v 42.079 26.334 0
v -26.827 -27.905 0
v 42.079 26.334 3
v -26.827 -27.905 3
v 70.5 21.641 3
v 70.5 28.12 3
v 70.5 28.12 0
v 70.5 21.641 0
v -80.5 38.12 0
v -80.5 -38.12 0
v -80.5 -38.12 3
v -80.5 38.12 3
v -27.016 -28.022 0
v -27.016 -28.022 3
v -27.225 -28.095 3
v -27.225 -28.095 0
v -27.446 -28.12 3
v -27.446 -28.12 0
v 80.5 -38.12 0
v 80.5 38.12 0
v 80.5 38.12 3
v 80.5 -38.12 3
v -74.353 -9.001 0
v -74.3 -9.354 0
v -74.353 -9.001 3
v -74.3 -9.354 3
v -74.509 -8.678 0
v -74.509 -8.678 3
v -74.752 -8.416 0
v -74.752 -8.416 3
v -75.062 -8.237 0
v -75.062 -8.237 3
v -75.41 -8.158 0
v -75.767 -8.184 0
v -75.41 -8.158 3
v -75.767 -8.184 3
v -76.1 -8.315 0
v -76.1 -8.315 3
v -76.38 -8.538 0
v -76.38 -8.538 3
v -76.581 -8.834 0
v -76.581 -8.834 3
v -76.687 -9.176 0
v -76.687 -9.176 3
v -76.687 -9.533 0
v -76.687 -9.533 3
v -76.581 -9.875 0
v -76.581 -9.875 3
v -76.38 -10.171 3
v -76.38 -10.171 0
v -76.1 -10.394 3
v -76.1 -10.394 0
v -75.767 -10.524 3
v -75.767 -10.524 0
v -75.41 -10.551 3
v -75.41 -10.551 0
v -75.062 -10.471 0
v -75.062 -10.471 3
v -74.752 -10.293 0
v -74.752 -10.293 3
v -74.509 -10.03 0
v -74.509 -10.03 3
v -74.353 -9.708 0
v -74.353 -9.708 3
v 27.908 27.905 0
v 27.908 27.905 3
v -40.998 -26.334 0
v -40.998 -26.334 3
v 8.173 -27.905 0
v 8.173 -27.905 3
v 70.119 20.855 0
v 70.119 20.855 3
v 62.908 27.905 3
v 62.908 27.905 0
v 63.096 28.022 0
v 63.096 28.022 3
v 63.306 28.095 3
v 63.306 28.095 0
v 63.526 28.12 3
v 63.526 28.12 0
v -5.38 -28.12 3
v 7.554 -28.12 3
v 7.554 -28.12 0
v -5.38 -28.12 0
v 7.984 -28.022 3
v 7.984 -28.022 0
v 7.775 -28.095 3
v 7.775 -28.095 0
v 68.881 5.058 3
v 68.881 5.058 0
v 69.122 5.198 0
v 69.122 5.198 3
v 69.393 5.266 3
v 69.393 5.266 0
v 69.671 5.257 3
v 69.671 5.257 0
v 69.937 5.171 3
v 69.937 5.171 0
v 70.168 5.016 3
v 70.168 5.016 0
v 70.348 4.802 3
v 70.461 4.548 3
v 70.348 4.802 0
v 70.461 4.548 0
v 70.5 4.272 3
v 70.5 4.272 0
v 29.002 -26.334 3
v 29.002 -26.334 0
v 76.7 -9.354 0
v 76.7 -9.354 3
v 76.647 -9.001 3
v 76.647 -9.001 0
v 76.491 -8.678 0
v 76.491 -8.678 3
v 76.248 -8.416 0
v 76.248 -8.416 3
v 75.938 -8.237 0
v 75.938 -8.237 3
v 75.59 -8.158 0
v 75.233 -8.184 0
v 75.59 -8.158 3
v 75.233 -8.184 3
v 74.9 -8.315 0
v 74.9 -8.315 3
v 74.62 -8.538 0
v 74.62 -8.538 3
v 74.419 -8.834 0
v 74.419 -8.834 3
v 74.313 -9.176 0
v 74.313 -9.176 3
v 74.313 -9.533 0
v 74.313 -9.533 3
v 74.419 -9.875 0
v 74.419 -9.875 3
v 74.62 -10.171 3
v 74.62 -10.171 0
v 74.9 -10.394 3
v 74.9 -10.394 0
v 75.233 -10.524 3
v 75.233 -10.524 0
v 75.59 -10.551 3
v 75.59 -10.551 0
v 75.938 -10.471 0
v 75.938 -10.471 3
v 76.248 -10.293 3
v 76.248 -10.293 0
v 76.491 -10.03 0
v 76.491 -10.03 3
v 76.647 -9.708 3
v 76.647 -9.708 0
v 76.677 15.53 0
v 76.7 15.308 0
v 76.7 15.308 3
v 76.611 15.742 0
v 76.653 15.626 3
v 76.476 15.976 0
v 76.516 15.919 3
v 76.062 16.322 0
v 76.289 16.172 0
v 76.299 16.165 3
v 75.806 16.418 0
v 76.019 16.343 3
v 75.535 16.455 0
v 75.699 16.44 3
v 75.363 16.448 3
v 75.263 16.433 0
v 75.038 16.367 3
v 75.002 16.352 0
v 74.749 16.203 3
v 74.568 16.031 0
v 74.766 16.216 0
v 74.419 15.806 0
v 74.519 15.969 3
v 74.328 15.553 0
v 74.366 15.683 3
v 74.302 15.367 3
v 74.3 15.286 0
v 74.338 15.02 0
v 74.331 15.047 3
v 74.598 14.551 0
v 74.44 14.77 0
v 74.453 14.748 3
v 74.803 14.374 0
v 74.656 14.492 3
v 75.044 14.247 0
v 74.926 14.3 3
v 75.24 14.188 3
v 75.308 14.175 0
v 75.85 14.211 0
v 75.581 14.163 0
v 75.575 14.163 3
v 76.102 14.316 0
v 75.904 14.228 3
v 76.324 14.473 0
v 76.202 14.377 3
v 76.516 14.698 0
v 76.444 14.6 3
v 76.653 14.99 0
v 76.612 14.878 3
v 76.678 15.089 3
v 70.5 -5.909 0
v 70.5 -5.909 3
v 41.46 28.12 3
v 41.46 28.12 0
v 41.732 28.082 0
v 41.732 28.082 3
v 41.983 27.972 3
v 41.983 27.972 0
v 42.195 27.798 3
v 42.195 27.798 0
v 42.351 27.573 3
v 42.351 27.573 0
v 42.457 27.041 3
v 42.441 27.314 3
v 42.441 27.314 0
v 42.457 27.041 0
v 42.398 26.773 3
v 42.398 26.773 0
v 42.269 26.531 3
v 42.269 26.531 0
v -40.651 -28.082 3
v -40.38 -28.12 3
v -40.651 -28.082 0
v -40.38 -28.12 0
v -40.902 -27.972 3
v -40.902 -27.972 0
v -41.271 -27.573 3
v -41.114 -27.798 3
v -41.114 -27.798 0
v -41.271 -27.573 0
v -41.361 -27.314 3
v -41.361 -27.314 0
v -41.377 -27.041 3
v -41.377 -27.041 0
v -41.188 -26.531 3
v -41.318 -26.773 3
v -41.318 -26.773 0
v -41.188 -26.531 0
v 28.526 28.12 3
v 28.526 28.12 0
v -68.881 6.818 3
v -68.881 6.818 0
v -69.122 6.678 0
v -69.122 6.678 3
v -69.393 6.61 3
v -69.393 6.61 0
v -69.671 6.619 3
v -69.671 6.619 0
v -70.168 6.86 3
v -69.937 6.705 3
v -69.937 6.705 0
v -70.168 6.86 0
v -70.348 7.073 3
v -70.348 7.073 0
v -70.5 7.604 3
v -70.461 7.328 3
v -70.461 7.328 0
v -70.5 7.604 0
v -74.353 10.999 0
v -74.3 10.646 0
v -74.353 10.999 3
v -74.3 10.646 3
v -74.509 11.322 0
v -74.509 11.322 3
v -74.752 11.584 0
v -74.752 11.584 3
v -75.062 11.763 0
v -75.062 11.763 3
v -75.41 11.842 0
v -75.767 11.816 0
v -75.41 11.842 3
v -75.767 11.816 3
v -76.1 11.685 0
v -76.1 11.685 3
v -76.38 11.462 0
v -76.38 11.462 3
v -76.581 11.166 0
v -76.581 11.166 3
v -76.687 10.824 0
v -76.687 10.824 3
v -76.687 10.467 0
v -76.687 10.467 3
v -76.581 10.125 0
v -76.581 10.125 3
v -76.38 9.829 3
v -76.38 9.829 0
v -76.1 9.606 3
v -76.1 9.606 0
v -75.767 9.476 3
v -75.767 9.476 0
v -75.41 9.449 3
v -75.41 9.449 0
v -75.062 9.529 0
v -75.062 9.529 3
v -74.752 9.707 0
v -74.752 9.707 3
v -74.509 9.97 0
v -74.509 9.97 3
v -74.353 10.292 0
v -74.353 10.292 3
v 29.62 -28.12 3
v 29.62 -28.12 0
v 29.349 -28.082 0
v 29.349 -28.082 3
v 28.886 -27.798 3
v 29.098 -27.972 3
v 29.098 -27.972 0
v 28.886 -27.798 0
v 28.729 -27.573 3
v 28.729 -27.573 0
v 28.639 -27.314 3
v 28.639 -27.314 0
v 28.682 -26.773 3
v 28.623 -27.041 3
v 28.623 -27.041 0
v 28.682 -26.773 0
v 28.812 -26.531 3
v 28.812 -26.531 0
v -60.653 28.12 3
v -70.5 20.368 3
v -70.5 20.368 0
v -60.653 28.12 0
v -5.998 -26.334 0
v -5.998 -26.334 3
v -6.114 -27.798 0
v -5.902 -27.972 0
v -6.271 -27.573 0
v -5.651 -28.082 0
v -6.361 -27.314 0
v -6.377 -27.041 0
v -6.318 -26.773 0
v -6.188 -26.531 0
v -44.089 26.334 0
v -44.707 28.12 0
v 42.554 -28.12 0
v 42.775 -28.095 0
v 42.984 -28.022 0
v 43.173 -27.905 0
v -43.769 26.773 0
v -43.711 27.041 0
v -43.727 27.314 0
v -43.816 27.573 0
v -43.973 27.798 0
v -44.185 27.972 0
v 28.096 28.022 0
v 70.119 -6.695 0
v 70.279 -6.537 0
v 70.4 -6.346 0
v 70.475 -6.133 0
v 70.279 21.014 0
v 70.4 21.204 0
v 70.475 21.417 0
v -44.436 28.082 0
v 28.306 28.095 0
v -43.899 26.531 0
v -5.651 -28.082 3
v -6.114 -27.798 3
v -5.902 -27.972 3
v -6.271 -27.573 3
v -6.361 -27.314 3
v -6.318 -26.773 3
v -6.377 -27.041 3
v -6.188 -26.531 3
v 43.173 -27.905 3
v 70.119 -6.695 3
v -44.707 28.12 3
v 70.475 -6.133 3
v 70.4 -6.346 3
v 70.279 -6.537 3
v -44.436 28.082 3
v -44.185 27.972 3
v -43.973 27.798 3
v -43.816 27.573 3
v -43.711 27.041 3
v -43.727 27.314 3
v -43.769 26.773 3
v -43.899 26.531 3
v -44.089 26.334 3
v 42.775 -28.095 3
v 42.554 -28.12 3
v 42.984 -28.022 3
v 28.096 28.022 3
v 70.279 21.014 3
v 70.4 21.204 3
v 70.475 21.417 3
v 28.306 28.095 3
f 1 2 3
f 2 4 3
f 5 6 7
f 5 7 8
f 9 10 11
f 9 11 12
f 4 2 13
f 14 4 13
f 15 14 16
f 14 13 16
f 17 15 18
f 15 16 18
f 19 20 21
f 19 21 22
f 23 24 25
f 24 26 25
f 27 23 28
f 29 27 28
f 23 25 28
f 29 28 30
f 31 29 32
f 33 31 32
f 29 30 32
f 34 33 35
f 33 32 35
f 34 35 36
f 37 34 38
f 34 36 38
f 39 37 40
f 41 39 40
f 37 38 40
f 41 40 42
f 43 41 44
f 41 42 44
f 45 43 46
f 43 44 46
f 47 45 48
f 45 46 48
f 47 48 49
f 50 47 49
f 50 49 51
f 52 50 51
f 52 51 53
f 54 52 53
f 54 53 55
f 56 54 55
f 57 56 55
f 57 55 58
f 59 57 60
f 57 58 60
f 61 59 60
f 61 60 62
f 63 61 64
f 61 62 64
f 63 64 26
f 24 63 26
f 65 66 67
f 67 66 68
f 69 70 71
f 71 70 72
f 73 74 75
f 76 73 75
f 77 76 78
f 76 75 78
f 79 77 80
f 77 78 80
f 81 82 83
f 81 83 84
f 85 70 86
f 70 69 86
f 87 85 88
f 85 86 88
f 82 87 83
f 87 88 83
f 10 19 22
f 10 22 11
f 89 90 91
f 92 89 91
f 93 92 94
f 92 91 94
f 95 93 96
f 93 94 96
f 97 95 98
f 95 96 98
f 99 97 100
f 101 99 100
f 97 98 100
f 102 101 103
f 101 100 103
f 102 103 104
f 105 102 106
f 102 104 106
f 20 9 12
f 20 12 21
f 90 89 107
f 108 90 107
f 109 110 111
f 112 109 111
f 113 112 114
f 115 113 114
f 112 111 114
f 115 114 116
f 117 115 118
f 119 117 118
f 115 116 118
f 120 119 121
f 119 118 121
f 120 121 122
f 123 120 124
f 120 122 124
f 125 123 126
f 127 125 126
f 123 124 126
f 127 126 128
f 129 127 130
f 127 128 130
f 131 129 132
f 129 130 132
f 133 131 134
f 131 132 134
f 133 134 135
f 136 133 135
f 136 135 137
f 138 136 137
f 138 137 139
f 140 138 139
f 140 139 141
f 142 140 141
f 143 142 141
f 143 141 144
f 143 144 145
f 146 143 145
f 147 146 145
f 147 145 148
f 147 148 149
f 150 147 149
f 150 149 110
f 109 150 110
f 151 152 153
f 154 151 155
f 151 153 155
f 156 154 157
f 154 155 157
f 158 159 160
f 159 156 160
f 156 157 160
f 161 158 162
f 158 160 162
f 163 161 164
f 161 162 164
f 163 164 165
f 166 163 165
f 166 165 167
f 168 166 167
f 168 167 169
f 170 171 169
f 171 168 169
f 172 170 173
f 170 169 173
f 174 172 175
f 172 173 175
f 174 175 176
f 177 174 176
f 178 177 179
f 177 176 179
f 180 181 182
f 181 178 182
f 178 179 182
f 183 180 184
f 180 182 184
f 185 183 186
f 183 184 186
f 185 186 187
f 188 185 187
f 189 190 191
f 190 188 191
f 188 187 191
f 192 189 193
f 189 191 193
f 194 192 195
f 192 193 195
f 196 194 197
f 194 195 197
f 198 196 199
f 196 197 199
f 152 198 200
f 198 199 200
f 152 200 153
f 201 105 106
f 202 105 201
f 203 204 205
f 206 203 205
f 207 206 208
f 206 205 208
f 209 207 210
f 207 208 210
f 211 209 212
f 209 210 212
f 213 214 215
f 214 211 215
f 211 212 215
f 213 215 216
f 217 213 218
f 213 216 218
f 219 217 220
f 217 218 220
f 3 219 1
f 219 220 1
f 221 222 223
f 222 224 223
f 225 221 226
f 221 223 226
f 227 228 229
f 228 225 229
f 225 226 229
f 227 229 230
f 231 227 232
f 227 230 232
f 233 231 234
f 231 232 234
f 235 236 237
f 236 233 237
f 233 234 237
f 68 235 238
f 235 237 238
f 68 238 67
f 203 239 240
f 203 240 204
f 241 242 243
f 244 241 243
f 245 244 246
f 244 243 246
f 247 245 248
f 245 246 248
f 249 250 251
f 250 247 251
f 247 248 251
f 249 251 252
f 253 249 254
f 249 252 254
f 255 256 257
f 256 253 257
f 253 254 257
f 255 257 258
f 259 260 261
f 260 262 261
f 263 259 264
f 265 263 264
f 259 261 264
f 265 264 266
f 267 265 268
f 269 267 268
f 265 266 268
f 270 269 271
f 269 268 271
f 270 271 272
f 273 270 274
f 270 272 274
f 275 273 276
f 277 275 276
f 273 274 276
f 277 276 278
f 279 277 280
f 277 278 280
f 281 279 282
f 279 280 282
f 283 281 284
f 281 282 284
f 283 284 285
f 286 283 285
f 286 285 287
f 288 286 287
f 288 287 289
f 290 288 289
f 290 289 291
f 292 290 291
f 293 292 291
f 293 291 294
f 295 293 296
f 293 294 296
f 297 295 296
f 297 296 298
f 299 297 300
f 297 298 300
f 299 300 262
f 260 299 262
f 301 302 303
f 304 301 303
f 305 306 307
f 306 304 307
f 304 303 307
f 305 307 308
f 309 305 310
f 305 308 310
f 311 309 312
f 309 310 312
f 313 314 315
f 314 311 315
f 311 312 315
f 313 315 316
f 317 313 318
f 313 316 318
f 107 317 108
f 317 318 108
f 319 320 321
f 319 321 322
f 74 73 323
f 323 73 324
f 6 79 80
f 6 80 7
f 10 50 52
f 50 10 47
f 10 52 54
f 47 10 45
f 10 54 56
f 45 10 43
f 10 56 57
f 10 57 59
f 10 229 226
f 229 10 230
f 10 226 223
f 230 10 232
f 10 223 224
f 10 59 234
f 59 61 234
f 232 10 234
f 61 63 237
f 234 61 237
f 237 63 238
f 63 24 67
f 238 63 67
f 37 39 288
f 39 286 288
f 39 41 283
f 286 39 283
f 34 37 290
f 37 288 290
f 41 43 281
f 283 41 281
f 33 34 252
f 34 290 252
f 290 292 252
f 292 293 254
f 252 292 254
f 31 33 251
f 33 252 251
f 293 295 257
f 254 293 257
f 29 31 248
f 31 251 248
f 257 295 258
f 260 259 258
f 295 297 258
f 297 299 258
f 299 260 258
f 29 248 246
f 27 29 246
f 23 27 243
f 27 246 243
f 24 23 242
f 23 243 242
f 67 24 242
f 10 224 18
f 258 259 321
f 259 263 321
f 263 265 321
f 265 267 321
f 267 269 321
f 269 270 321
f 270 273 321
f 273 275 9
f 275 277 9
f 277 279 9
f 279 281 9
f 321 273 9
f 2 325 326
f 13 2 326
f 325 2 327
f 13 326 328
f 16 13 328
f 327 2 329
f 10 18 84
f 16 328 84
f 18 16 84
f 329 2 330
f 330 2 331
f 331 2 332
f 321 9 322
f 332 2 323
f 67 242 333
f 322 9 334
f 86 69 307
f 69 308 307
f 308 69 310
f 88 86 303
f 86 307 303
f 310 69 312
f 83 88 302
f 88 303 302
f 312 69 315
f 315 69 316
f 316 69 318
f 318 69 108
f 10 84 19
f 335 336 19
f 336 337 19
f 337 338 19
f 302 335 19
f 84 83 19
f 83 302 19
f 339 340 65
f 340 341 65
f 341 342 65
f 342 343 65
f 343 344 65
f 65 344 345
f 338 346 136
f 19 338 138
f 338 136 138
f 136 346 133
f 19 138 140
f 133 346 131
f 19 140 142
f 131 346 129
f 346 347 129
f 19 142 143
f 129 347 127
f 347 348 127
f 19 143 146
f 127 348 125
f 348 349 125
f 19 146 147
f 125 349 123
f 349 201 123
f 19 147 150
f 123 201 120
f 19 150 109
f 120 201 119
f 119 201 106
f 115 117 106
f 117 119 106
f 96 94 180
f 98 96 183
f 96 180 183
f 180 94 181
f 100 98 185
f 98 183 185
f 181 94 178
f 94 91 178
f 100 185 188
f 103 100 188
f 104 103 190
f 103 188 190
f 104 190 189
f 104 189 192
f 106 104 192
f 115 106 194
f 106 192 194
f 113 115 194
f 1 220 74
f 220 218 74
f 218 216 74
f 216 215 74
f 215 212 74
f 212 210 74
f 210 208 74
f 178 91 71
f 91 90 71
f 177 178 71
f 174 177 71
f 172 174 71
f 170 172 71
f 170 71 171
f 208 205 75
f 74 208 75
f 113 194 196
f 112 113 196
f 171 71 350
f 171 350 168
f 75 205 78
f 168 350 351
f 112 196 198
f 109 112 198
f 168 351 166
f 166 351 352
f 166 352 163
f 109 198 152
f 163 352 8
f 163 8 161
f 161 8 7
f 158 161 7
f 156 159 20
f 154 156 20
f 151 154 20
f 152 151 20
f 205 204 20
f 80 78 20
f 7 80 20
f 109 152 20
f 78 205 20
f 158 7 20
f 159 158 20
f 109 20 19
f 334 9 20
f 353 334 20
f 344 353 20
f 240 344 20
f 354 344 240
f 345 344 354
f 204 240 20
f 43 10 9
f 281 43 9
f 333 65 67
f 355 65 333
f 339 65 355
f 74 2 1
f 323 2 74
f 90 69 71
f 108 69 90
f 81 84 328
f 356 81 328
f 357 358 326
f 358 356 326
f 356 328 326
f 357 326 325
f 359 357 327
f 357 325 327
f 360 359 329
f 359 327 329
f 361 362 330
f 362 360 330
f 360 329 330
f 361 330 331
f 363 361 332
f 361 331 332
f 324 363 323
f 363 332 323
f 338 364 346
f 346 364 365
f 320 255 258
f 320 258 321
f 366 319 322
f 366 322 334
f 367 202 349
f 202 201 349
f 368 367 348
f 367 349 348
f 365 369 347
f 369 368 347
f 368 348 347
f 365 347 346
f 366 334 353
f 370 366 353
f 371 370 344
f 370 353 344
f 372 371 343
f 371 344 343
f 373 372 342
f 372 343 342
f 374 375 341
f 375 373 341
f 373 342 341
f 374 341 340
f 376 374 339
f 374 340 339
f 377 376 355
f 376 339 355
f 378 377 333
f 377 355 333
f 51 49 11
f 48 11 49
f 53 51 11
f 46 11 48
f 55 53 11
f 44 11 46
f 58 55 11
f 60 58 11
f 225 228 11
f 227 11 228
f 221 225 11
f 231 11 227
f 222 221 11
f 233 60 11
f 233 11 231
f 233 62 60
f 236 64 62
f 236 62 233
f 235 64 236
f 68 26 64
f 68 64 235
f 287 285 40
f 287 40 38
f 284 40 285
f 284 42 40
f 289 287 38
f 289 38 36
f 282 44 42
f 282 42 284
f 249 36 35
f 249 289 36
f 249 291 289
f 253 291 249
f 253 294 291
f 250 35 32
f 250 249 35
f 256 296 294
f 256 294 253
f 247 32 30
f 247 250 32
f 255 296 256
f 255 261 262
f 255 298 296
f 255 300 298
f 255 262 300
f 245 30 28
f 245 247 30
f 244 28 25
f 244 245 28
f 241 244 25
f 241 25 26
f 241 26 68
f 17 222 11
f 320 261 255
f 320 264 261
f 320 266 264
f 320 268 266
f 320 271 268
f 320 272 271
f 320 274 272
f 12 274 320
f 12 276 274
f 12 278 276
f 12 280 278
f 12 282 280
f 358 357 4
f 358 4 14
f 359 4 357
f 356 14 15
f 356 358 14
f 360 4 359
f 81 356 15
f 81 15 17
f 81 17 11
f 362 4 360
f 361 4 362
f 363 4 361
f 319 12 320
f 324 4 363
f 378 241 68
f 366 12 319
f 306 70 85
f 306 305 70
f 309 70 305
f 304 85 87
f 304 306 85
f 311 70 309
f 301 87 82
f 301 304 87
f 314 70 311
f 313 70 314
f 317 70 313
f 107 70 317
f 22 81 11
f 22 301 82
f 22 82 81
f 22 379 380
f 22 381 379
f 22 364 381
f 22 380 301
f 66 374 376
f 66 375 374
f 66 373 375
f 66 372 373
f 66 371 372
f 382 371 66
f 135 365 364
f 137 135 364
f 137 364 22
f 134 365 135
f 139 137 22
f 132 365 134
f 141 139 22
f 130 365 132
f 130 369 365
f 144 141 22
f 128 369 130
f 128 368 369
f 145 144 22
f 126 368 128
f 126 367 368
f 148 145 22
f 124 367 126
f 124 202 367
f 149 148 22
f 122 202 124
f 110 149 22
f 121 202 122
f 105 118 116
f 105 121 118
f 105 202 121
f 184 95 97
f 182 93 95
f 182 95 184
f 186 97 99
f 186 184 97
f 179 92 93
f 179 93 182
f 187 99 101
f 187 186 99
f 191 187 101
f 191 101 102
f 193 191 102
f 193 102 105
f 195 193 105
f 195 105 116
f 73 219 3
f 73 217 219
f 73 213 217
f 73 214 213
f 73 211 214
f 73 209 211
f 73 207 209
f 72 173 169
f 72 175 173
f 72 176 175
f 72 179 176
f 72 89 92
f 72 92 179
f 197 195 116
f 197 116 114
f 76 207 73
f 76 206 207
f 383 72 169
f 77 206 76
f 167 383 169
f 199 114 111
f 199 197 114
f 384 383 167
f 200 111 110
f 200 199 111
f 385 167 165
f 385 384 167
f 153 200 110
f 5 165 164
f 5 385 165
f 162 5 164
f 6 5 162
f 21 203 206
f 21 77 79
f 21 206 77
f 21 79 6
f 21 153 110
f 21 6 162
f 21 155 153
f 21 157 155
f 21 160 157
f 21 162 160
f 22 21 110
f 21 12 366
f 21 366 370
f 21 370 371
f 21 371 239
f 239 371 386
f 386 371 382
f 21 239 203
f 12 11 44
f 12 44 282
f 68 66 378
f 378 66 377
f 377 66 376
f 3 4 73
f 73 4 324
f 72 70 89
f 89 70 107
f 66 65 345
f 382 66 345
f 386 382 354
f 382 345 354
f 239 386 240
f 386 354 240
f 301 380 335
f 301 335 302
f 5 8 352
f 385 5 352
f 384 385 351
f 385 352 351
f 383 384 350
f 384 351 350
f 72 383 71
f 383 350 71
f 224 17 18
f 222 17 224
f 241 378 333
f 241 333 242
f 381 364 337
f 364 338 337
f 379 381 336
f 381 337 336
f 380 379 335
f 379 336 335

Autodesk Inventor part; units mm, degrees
ref_plane "YZ Plane" through (0, 0, 0) normal (1, 0, 0) x (0, 1, 0)
ref_plane "XZ Plane" through (0, 0, 0) normal (0, 1, 0) x (-1, 0, 0)
ref_plane "XY Plane" through (0, 0, 0) normal (0, 0, 1) x (1, 0, 0)
sketch "草图1" plane through (0, 0, 0) normal (0, 0, 1) x (1, 0, 0)
  line L0 (80.5, -38.1196) -> (-80.5, -38.1196)
  line L1 (-80.5, -38.1196) -> (-80.5, 38.1196)
  line L2 (-80.5, 38.1196) -> (80.5, 38.1196)
  line L3 (80.5, 38.1196) -> (80.5, -38.1196)
  line L4 (80.5, -38.1196) -> (-80.5, 38.1196) construction
  line L5 (-80.5, -38.1196) -> (80.5, 38.1196) construction
  point P0 (0, 0)
  dimension "d1" = 161
extrude "拉伸1" add sketch "草图1" along normal blind 3
sketch "草图2" plane through (0, 0, 3) normal (0, 0, 1) x (1, 0, 0)
  line L0 (61.6798, 137.1398) -> (-176.304, -50.1889)
  line L1 (-176.304, -50.1889) -> (-170.1188, -58.0466)
  line L2 (-170.1188, -58.0466) -> (67.865, 129.282)
  line L3 (67.865, 129.282) -> (61.6798, 137.1398)
  line L4 (80.5, 38.1196) -> (-80.5, 38.1196) projected
  line L5 (96.6798, 137.1398) -> (-141.304, -50.1889)
  line L6 (102.865, 129.282) -> (96.6798, 137.1398)
  line L7 (-135.1188, -58.0466) -> (102.865, 129.282)
  line L8 (-141.304, -50.1889) -> (-135.1188, -58.0466)
  line L9 (131.6798, 137.1398) -> (-106.304, -50.1889)
  line L10 (137.865, 129.282) -> (131.6798, 137.1398)
  line L11 (-100.1188, -58.0466) -> (137.865, 129.282)
  line L12 (-106.304, -50.1889) -> (-100.1188, -58.0466)
  line L13 (166.6798, 137.1398) -> (-71.304, -50.1889)
  line L14 (172.865, 129.282) -> (166.6798, 137.1398)
  line L15 (-65.1188, -58.0466) -> (172.865, 129.282)
  line L16 (-71.304, -50.1889) -> (-65.1188, -58.0466)
  line L17 (201.6798, 137.1398) -> (-36.304, -50.1889)
  line L18 (207.865, 129.282) -> (201.6798, 137.1398)
  line L19 (-30.1188, -58.0466) -> (207.865, 129.282)
  line L20 (-36.304, -50.1889) -> (-30.1188, -58.0466)
  line L21 (236.6798, 137.1398) -> (-1.304, -50.1889)
  line L22 (242.865, 129.282) -> (236.6798, 137.1398)
  line L23 (4.8812, -58.0466) -> (242.865, 129.282)
  line L24 (-1.304, -50.1889) -> (4.8812, -58.0466)
  line L25 (271.6798, 137.1398) -> (33.696, -50.1889)
  line L26 (277.865, 129.282) -> (271.6798, 137.1398)
  line L27 (39.8812, -58.0466) -> (277.865, 129.282)
  line L28 (33.696, -50.1889) -> (39.8812, -58.0466)
  line L29 (-80.5, 38.1196) -> (-80.5, -38.1196) projected
  line L30 (80.5, -38.1196) -> (80.5, 38.1196) projected
  line L31 (-80.5, -38.1196) -> (80.5, -38.1196) projected
  line L32 (-70.5, 28.1196) -> (70.5, 28.1196)
  line L33 (70.5, 28.1196) -> (70.5, -28.1196)
  line L34 (70.5, -28.1196) -> (-70.5, -28.1196)
  line L35 (-70.5, -28.1196) -> (-70.5, 28.1196)
  point P0 (0, 0)
  point P1 (-51.1269, 35.6177)
  point P2 (-16.1269, 35.6177)
  point P3 (18.8731, 35.6177)
  point P4 (53.8731, 35.6177)
  point P5 (88.8731, 35.6177)
  point P6 (123.8731, 35.6177)
  point P7 (158.8731, 35.6177)
  point P8 (26.733, -28.1196)
  point P9 (42.9006, -28.1196)
  point P10 (70.5, -6.3948)
  point P11 (70.5, 6.3315)
  point P12 (-8.267, -28.1196)
  point P13 (7.9006, -28.1196)
  point P14 (70.5, 21.1554)
  point P15 (63.1798, 28.1196)
  point P16 (-43.267, -28.1196)
  point P17 (-27.0994, -28.1196)
  point P18 (44.3475, 28.1196)
  point P19 (28.1798, 28.1196)
  point P20 (-70.5, -7.182)
  point P21 (-70.5, -22.0058)
  point P22 (-6.8202, 28.1196)
  point P23 (-25.6525, 28.1196)
  point P24 (-70.5, 20.3682)
  point P25 (-70.5, 5.5444)
  point P26 (-41.8202, 28.1196)
  point P27 (-60.6525, 28.1196)
  dimension "d5" = 10
  dimension "d8" = 35
  dimension "d13" = 10
extrude "拉伸2" cut sketch "草图2" against normal blind 10 contours L32 L5 L35 L2 | L32 L15 L34 L13 | L32 L33 L19 L34 L17 | L21 L33 L23 L34
fillet "圆角1" radius 1 14 edges at (28.1798, 28.1196, 1.5) (44.3475, 28.1196, 1.5) (63.1798, 28.1196, 1.5) (70.5, 21.1554, 1.5) (70.5, 6.3315, 1.5) (26.733, -28.1196, 1.5) (42.9006, -28.1196, 1.5) (70.5, -6.3948, 1.5) (-8.267, -28.1196, 1.5) (7.9006, -28.1196, 1.5) (-43.267, -28.1196, 1.5) (-27.0994, -28.1196, 1.5) (-70.5, 5.5444, 1.5) (-41.8202, 28.1196, 1.5)
sketch "草图3" plane through (0, 0, 3) normal (0, 0, 1) x (1, 0, 0)
  ellipse E0 centre (75.5, 15.3081) end of major axis (76.7, 15.3081) minor radius 1.1476 projected
  circle A0 centre (75.5, -9.3544) radius 1.2 projected
  circle A1 centre (-75.5, 10.6456) radius 1.2 projected
  circle A2 centre (-75.5, -9.3544) radius 1.2 projected
  point P0 (0, 0)
extrude "拉伸3" cut sketch "草图3" against normal blind 10
equation "\"d14\" = d5"
equation "\"d17\" = d5"
properties part number "后板2"
